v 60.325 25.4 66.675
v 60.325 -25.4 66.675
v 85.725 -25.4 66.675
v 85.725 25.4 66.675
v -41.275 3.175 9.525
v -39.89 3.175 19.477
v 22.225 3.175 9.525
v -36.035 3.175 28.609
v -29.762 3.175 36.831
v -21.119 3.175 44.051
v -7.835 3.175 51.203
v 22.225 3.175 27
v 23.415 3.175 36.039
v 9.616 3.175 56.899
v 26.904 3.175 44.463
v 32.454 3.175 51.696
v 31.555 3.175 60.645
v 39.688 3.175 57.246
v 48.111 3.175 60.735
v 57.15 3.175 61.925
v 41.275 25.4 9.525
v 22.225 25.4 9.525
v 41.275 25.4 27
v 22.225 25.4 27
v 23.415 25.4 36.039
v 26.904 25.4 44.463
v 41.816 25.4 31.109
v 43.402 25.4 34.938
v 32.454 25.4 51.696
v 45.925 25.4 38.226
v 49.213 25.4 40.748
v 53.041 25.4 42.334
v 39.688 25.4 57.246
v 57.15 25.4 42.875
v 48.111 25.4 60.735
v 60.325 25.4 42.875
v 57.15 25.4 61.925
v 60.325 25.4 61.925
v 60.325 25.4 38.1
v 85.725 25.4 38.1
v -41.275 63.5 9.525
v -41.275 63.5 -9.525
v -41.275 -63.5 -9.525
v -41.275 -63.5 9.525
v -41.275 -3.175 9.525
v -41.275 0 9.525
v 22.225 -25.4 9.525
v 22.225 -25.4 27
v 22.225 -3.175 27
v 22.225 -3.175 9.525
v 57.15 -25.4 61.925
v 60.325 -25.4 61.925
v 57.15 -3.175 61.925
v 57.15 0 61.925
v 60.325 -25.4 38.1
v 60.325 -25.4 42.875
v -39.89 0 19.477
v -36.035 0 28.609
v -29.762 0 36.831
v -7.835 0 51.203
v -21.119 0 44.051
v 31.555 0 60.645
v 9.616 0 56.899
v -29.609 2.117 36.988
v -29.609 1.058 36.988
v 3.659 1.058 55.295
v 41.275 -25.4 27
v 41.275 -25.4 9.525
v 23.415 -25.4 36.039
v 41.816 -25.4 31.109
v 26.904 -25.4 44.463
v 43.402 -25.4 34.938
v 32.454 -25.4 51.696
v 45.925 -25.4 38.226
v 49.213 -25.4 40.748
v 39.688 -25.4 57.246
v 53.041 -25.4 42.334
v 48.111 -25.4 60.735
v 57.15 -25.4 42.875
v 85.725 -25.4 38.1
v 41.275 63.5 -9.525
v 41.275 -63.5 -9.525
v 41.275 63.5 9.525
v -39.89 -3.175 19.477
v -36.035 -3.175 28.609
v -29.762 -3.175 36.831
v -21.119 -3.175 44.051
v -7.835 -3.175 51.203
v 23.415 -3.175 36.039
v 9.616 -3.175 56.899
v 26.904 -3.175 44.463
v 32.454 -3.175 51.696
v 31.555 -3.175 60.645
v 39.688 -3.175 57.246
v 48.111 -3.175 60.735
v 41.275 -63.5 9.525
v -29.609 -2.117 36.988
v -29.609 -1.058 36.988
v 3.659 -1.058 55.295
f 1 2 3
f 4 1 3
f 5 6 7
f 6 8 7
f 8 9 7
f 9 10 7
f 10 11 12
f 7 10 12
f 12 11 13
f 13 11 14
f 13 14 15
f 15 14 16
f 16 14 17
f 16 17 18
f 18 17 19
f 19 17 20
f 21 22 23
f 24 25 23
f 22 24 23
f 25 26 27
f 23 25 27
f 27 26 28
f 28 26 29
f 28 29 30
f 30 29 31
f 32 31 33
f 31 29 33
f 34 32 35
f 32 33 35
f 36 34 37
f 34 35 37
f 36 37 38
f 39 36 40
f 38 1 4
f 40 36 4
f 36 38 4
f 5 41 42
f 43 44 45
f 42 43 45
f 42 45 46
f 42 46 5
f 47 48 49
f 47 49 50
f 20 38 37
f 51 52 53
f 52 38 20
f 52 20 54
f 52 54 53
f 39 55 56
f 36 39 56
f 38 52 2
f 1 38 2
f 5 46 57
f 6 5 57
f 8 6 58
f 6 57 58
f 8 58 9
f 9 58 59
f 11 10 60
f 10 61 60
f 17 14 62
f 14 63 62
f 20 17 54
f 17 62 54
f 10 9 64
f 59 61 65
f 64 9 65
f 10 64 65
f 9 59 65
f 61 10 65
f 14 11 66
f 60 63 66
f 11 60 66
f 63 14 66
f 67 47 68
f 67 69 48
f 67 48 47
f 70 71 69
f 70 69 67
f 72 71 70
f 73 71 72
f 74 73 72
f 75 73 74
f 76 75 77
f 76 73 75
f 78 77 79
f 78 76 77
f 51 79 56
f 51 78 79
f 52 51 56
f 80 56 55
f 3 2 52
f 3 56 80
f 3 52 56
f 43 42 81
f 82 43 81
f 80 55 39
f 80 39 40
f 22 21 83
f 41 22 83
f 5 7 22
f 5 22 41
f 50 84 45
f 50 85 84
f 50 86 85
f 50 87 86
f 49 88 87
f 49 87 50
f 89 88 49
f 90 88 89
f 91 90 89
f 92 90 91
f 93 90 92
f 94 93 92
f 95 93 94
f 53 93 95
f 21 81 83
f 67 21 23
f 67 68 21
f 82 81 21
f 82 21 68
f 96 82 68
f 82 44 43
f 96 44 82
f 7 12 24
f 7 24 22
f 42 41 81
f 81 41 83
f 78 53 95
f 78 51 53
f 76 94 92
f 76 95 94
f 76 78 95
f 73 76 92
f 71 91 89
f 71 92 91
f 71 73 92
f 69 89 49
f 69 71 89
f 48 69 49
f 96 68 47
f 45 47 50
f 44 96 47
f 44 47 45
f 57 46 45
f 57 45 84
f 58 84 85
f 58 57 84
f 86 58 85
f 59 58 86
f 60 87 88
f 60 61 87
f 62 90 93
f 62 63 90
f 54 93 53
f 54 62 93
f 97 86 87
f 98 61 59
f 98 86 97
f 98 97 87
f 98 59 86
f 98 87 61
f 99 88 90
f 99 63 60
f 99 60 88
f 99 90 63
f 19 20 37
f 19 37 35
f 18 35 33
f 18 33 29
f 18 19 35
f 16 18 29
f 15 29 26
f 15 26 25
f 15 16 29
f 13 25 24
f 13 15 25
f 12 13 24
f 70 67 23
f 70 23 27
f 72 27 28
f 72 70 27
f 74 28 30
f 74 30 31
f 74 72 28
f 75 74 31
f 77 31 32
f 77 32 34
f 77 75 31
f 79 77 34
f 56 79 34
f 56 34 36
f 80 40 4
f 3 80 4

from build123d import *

# Parameters (mm, degrees)
F1_DEPTH = 63.5
F0_W     = 25.4
F0_H     = 19.05
F0_H_2   = 4.7498
F0_H_3   = 4.7752
F2_DEPTH = 25.4
F3_DEPTH = 3.175


with BuildPart() as f1:
    # F0 (on Front) → F1 (new body, symmetric)
    with BuildSketch(Plane.XZ):
        Polygon((41.275, -9.525), (41.275, 9.525), (22.225, 9.525), (-41.275, 9.525), (-41.275, -9.525), align=None)
    extrude(amount=F1_DEPTH, both=True)

    # F0 (on Front) → F2 (join, symmetric)
    with BuildSketch(Plane.XZ):
        with BuildLine():
            Line((22.225, 9.525), (41.275, 9.525))
            Line((41.275, 9.525), (41.275, 27.0002))
            ThreePointArc((41.275, 27.0002), (45.9246798487, 38.2255201513), (57.15, 42.8752))
            Line((57.15, 42.8752), (60.325, 42.8752))
            Line((60.325, 42.8752), (60.325, 61.9252))
            Line((60.325, 61.9252), (57.15, 61.9252))
            ThreePointArc((57.15, 61.9252), (32.4542956671, 51.6959043329), (22.225, 27.0002))
            Line((22.225, 27.0002), (22.225, 9.525))
        make_face()
        with Locations((73.025, 52.4002)):
            Rectangle(F0_W, F0_H)
        with Locations((73.025, 64.3001)):
            Rectangle(F0_W, F0_H_2)
        with Locations((73.025, 40.4876)):
            Rectangle(F0_W, F0_H_3)
    extrude(amount=F2_DEPTH, both=True)

    # F0 (on Front) → F3 (join, symmetric)
    with BuildSketch(Plane.XZ):
        with BuildLine():
            Line((-41.275, 9.525), (22.225, 9.525))
            Line((22.225, 9.525), (22.225, 27.0002))
            ThreePointArc((22.225, 27.0002), (32.4542956671, 51.6959043329), (57.15, 61.9252))
            add(Edge.make_bspline(
                [(-41.275, 9.525), (-40.8707372844, 40.7271385193), (-5.9925662354, 61.9721710682), (57.15, 61.9252)],
                knots=[0, 0, 0, 0, 111.5045361635, 111.5045361635, 111.5045361635, 111.5045361635], degree=3))
        make_face()
    extrude(amount=F3_DEPTH, both=True)


solid = f1.part
